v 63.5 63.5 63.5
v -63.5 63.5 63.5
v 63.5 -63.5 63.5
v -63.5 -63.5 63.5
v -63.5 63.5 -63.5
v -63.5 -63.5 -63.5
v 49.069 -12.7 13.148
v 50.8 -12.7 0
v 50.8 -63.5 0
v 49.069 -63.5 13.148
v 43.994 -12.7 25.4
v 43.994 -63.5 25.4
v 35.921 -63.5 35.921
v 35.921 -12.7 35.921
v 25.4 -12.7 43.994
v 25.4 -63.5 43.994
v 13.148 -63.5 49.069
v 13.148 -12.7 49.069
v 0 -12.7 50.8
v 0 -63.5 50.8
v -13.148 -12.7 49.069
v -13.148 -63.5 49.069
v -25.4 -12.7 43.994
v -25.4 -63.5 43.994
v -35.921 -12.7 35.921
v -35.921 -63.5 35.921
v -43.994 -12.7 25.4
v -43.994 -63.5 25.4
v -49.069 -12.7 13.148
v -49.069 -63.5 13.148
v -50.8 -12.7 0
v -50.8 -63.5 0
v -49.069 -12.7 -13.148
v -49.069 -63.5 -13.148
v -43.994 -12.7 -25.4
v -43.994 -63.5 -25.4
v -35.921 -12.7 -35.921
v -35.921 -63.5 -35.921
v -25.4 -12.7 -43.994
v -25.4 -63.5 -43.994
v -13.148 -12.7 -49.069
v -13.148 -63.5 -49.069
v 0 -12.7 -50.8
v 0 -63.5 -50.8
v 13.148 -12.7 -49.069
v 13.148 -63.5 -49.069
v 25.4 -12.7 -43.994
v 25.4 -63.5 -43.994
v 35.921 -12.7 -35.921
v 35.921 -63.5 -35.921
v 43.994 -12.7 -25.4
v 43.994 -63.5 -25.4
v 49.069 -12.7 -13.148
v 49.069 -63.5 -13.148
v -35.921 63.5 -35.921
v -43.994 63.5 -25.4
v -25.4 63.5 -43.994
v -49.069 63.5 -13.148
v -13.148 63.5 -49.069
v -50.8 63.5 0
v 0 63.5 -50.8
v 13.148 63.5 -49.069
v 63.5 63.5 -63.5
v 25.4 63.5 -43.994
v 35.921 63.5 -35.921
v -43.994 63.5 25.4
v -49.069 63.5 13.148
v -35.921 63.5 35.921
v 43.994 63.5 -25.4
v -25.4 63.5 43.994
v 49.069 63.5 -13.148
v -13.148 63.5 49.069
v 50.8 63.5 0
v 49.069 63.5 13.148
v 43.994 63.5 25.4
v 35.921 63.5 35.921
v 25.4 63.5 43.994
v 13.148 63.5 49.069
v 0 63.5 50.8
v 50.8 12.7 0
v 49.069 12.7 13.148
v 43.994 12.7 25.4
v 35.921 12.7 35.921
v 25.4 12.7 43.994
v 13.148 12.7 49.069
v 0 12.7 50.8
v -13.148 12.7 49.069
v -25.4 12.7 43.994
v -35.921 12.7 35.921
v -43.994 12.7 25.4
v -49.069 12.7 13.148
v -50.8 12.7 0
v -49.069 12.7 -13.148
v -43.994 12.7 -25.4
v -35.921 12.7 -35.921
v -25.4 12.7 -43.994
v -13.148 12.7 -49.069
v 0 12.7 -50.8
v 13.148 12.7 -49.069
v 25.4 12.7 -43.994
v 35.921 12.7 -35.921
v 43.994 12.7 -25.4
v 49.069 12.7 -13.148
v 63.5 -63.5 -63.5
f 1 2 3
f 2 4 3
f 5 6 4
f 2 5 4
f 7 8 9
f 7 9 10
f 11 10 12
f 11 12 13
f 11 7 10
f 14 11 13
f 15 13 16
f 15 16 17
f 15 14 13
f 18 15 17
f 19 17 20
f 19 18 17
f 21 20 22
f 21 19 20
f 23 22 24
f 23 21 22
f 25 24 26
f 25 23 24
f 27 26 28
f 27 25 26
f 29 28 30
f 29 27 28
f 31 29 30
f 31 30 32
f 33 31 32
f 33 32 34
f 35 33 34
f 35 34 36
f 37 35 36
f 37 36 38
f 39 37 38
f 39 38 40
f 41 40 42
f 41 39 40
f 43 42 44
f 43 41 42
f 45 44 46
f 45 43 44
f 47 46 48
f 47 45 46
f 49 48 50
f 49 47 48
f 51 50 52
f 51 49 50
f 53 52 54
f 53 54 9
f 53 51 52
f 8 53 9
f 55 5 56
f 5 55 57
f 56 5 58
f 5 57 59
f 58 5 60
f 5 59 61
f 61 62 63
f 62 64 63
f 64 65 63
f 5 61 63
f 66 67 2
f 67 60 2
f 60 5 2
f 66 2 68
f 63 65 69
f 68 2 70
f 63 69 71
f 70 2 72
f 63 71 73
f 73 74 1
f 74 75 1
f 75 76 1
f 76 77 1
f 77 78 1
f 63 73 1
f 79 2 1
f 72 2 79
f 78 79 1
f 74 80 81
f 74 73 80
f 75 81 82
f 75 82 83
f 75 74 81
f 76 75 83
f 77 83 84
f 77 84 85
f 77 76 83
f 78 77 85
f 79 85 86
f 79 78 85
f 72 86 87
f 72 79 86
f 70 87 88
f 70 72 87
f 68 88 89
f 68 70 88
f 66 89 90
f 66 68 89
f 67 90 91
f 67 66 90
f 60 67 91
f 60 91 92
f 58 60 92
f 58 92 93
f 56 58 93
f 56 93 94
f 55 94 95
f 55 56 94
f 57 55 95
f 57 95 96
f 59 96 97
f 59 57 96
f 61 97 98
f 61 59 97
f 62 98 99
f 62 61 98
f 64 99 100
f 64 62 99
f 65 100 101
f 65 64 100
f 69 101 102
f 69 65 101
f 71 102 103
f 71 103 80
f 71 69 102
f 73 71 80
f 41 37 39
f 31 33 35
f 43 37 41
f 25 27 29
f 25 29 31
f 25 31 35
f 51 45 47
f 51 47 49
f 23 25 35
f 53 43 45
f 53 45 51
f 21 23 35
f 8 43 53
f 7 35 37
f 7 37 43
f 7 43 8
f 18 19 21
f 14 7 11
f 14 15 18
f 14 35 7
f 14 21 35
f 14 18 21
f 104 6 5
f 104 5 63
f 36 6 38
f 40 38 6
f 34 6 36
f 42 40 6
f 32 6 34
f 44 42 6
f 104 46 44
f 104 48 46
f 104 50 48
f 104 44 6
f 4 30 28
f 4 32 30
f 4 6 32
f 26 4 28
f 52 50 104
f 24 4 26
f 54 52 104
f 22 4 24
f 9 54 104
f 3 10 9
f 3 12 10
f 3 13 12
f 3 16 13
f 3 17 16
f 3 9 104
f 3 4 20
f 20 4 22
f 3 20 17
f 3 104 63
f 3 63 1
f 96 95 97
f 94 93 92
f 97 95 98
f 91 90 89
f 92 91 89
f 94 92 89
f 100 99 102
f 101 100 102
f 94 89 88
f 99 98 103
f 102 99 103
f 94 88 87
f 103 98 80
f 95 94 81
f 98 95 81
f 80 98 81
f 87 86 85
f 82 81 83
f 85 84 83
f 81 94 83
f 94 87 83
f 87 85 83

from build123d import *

# Parameters (mm, degrees)
F0_W     = 127
F0_H     = 127
F0_R     = 50.8
F1_DEPTH = 63.5
F2_DEPTH = 12.7


with BuildPart() as f1:
    # F0 (on Front) → F1 (new body, symmetric)
    with BuildSketch(Plane.XZ):
        Rectangle(F0_W, F0_H)
        Circle(F0_R, mode=Mode.SUBTRACT)
    extrude(amount=F1_DEPTH, both=True)

    # F0 (on Front) → F2 (join, symmetric)
    with BuildSketch(Plane.XZ):
        Circle(F0_R)
    extrude(amount=F2_DEPTH, both=True)


solid = f1.part
